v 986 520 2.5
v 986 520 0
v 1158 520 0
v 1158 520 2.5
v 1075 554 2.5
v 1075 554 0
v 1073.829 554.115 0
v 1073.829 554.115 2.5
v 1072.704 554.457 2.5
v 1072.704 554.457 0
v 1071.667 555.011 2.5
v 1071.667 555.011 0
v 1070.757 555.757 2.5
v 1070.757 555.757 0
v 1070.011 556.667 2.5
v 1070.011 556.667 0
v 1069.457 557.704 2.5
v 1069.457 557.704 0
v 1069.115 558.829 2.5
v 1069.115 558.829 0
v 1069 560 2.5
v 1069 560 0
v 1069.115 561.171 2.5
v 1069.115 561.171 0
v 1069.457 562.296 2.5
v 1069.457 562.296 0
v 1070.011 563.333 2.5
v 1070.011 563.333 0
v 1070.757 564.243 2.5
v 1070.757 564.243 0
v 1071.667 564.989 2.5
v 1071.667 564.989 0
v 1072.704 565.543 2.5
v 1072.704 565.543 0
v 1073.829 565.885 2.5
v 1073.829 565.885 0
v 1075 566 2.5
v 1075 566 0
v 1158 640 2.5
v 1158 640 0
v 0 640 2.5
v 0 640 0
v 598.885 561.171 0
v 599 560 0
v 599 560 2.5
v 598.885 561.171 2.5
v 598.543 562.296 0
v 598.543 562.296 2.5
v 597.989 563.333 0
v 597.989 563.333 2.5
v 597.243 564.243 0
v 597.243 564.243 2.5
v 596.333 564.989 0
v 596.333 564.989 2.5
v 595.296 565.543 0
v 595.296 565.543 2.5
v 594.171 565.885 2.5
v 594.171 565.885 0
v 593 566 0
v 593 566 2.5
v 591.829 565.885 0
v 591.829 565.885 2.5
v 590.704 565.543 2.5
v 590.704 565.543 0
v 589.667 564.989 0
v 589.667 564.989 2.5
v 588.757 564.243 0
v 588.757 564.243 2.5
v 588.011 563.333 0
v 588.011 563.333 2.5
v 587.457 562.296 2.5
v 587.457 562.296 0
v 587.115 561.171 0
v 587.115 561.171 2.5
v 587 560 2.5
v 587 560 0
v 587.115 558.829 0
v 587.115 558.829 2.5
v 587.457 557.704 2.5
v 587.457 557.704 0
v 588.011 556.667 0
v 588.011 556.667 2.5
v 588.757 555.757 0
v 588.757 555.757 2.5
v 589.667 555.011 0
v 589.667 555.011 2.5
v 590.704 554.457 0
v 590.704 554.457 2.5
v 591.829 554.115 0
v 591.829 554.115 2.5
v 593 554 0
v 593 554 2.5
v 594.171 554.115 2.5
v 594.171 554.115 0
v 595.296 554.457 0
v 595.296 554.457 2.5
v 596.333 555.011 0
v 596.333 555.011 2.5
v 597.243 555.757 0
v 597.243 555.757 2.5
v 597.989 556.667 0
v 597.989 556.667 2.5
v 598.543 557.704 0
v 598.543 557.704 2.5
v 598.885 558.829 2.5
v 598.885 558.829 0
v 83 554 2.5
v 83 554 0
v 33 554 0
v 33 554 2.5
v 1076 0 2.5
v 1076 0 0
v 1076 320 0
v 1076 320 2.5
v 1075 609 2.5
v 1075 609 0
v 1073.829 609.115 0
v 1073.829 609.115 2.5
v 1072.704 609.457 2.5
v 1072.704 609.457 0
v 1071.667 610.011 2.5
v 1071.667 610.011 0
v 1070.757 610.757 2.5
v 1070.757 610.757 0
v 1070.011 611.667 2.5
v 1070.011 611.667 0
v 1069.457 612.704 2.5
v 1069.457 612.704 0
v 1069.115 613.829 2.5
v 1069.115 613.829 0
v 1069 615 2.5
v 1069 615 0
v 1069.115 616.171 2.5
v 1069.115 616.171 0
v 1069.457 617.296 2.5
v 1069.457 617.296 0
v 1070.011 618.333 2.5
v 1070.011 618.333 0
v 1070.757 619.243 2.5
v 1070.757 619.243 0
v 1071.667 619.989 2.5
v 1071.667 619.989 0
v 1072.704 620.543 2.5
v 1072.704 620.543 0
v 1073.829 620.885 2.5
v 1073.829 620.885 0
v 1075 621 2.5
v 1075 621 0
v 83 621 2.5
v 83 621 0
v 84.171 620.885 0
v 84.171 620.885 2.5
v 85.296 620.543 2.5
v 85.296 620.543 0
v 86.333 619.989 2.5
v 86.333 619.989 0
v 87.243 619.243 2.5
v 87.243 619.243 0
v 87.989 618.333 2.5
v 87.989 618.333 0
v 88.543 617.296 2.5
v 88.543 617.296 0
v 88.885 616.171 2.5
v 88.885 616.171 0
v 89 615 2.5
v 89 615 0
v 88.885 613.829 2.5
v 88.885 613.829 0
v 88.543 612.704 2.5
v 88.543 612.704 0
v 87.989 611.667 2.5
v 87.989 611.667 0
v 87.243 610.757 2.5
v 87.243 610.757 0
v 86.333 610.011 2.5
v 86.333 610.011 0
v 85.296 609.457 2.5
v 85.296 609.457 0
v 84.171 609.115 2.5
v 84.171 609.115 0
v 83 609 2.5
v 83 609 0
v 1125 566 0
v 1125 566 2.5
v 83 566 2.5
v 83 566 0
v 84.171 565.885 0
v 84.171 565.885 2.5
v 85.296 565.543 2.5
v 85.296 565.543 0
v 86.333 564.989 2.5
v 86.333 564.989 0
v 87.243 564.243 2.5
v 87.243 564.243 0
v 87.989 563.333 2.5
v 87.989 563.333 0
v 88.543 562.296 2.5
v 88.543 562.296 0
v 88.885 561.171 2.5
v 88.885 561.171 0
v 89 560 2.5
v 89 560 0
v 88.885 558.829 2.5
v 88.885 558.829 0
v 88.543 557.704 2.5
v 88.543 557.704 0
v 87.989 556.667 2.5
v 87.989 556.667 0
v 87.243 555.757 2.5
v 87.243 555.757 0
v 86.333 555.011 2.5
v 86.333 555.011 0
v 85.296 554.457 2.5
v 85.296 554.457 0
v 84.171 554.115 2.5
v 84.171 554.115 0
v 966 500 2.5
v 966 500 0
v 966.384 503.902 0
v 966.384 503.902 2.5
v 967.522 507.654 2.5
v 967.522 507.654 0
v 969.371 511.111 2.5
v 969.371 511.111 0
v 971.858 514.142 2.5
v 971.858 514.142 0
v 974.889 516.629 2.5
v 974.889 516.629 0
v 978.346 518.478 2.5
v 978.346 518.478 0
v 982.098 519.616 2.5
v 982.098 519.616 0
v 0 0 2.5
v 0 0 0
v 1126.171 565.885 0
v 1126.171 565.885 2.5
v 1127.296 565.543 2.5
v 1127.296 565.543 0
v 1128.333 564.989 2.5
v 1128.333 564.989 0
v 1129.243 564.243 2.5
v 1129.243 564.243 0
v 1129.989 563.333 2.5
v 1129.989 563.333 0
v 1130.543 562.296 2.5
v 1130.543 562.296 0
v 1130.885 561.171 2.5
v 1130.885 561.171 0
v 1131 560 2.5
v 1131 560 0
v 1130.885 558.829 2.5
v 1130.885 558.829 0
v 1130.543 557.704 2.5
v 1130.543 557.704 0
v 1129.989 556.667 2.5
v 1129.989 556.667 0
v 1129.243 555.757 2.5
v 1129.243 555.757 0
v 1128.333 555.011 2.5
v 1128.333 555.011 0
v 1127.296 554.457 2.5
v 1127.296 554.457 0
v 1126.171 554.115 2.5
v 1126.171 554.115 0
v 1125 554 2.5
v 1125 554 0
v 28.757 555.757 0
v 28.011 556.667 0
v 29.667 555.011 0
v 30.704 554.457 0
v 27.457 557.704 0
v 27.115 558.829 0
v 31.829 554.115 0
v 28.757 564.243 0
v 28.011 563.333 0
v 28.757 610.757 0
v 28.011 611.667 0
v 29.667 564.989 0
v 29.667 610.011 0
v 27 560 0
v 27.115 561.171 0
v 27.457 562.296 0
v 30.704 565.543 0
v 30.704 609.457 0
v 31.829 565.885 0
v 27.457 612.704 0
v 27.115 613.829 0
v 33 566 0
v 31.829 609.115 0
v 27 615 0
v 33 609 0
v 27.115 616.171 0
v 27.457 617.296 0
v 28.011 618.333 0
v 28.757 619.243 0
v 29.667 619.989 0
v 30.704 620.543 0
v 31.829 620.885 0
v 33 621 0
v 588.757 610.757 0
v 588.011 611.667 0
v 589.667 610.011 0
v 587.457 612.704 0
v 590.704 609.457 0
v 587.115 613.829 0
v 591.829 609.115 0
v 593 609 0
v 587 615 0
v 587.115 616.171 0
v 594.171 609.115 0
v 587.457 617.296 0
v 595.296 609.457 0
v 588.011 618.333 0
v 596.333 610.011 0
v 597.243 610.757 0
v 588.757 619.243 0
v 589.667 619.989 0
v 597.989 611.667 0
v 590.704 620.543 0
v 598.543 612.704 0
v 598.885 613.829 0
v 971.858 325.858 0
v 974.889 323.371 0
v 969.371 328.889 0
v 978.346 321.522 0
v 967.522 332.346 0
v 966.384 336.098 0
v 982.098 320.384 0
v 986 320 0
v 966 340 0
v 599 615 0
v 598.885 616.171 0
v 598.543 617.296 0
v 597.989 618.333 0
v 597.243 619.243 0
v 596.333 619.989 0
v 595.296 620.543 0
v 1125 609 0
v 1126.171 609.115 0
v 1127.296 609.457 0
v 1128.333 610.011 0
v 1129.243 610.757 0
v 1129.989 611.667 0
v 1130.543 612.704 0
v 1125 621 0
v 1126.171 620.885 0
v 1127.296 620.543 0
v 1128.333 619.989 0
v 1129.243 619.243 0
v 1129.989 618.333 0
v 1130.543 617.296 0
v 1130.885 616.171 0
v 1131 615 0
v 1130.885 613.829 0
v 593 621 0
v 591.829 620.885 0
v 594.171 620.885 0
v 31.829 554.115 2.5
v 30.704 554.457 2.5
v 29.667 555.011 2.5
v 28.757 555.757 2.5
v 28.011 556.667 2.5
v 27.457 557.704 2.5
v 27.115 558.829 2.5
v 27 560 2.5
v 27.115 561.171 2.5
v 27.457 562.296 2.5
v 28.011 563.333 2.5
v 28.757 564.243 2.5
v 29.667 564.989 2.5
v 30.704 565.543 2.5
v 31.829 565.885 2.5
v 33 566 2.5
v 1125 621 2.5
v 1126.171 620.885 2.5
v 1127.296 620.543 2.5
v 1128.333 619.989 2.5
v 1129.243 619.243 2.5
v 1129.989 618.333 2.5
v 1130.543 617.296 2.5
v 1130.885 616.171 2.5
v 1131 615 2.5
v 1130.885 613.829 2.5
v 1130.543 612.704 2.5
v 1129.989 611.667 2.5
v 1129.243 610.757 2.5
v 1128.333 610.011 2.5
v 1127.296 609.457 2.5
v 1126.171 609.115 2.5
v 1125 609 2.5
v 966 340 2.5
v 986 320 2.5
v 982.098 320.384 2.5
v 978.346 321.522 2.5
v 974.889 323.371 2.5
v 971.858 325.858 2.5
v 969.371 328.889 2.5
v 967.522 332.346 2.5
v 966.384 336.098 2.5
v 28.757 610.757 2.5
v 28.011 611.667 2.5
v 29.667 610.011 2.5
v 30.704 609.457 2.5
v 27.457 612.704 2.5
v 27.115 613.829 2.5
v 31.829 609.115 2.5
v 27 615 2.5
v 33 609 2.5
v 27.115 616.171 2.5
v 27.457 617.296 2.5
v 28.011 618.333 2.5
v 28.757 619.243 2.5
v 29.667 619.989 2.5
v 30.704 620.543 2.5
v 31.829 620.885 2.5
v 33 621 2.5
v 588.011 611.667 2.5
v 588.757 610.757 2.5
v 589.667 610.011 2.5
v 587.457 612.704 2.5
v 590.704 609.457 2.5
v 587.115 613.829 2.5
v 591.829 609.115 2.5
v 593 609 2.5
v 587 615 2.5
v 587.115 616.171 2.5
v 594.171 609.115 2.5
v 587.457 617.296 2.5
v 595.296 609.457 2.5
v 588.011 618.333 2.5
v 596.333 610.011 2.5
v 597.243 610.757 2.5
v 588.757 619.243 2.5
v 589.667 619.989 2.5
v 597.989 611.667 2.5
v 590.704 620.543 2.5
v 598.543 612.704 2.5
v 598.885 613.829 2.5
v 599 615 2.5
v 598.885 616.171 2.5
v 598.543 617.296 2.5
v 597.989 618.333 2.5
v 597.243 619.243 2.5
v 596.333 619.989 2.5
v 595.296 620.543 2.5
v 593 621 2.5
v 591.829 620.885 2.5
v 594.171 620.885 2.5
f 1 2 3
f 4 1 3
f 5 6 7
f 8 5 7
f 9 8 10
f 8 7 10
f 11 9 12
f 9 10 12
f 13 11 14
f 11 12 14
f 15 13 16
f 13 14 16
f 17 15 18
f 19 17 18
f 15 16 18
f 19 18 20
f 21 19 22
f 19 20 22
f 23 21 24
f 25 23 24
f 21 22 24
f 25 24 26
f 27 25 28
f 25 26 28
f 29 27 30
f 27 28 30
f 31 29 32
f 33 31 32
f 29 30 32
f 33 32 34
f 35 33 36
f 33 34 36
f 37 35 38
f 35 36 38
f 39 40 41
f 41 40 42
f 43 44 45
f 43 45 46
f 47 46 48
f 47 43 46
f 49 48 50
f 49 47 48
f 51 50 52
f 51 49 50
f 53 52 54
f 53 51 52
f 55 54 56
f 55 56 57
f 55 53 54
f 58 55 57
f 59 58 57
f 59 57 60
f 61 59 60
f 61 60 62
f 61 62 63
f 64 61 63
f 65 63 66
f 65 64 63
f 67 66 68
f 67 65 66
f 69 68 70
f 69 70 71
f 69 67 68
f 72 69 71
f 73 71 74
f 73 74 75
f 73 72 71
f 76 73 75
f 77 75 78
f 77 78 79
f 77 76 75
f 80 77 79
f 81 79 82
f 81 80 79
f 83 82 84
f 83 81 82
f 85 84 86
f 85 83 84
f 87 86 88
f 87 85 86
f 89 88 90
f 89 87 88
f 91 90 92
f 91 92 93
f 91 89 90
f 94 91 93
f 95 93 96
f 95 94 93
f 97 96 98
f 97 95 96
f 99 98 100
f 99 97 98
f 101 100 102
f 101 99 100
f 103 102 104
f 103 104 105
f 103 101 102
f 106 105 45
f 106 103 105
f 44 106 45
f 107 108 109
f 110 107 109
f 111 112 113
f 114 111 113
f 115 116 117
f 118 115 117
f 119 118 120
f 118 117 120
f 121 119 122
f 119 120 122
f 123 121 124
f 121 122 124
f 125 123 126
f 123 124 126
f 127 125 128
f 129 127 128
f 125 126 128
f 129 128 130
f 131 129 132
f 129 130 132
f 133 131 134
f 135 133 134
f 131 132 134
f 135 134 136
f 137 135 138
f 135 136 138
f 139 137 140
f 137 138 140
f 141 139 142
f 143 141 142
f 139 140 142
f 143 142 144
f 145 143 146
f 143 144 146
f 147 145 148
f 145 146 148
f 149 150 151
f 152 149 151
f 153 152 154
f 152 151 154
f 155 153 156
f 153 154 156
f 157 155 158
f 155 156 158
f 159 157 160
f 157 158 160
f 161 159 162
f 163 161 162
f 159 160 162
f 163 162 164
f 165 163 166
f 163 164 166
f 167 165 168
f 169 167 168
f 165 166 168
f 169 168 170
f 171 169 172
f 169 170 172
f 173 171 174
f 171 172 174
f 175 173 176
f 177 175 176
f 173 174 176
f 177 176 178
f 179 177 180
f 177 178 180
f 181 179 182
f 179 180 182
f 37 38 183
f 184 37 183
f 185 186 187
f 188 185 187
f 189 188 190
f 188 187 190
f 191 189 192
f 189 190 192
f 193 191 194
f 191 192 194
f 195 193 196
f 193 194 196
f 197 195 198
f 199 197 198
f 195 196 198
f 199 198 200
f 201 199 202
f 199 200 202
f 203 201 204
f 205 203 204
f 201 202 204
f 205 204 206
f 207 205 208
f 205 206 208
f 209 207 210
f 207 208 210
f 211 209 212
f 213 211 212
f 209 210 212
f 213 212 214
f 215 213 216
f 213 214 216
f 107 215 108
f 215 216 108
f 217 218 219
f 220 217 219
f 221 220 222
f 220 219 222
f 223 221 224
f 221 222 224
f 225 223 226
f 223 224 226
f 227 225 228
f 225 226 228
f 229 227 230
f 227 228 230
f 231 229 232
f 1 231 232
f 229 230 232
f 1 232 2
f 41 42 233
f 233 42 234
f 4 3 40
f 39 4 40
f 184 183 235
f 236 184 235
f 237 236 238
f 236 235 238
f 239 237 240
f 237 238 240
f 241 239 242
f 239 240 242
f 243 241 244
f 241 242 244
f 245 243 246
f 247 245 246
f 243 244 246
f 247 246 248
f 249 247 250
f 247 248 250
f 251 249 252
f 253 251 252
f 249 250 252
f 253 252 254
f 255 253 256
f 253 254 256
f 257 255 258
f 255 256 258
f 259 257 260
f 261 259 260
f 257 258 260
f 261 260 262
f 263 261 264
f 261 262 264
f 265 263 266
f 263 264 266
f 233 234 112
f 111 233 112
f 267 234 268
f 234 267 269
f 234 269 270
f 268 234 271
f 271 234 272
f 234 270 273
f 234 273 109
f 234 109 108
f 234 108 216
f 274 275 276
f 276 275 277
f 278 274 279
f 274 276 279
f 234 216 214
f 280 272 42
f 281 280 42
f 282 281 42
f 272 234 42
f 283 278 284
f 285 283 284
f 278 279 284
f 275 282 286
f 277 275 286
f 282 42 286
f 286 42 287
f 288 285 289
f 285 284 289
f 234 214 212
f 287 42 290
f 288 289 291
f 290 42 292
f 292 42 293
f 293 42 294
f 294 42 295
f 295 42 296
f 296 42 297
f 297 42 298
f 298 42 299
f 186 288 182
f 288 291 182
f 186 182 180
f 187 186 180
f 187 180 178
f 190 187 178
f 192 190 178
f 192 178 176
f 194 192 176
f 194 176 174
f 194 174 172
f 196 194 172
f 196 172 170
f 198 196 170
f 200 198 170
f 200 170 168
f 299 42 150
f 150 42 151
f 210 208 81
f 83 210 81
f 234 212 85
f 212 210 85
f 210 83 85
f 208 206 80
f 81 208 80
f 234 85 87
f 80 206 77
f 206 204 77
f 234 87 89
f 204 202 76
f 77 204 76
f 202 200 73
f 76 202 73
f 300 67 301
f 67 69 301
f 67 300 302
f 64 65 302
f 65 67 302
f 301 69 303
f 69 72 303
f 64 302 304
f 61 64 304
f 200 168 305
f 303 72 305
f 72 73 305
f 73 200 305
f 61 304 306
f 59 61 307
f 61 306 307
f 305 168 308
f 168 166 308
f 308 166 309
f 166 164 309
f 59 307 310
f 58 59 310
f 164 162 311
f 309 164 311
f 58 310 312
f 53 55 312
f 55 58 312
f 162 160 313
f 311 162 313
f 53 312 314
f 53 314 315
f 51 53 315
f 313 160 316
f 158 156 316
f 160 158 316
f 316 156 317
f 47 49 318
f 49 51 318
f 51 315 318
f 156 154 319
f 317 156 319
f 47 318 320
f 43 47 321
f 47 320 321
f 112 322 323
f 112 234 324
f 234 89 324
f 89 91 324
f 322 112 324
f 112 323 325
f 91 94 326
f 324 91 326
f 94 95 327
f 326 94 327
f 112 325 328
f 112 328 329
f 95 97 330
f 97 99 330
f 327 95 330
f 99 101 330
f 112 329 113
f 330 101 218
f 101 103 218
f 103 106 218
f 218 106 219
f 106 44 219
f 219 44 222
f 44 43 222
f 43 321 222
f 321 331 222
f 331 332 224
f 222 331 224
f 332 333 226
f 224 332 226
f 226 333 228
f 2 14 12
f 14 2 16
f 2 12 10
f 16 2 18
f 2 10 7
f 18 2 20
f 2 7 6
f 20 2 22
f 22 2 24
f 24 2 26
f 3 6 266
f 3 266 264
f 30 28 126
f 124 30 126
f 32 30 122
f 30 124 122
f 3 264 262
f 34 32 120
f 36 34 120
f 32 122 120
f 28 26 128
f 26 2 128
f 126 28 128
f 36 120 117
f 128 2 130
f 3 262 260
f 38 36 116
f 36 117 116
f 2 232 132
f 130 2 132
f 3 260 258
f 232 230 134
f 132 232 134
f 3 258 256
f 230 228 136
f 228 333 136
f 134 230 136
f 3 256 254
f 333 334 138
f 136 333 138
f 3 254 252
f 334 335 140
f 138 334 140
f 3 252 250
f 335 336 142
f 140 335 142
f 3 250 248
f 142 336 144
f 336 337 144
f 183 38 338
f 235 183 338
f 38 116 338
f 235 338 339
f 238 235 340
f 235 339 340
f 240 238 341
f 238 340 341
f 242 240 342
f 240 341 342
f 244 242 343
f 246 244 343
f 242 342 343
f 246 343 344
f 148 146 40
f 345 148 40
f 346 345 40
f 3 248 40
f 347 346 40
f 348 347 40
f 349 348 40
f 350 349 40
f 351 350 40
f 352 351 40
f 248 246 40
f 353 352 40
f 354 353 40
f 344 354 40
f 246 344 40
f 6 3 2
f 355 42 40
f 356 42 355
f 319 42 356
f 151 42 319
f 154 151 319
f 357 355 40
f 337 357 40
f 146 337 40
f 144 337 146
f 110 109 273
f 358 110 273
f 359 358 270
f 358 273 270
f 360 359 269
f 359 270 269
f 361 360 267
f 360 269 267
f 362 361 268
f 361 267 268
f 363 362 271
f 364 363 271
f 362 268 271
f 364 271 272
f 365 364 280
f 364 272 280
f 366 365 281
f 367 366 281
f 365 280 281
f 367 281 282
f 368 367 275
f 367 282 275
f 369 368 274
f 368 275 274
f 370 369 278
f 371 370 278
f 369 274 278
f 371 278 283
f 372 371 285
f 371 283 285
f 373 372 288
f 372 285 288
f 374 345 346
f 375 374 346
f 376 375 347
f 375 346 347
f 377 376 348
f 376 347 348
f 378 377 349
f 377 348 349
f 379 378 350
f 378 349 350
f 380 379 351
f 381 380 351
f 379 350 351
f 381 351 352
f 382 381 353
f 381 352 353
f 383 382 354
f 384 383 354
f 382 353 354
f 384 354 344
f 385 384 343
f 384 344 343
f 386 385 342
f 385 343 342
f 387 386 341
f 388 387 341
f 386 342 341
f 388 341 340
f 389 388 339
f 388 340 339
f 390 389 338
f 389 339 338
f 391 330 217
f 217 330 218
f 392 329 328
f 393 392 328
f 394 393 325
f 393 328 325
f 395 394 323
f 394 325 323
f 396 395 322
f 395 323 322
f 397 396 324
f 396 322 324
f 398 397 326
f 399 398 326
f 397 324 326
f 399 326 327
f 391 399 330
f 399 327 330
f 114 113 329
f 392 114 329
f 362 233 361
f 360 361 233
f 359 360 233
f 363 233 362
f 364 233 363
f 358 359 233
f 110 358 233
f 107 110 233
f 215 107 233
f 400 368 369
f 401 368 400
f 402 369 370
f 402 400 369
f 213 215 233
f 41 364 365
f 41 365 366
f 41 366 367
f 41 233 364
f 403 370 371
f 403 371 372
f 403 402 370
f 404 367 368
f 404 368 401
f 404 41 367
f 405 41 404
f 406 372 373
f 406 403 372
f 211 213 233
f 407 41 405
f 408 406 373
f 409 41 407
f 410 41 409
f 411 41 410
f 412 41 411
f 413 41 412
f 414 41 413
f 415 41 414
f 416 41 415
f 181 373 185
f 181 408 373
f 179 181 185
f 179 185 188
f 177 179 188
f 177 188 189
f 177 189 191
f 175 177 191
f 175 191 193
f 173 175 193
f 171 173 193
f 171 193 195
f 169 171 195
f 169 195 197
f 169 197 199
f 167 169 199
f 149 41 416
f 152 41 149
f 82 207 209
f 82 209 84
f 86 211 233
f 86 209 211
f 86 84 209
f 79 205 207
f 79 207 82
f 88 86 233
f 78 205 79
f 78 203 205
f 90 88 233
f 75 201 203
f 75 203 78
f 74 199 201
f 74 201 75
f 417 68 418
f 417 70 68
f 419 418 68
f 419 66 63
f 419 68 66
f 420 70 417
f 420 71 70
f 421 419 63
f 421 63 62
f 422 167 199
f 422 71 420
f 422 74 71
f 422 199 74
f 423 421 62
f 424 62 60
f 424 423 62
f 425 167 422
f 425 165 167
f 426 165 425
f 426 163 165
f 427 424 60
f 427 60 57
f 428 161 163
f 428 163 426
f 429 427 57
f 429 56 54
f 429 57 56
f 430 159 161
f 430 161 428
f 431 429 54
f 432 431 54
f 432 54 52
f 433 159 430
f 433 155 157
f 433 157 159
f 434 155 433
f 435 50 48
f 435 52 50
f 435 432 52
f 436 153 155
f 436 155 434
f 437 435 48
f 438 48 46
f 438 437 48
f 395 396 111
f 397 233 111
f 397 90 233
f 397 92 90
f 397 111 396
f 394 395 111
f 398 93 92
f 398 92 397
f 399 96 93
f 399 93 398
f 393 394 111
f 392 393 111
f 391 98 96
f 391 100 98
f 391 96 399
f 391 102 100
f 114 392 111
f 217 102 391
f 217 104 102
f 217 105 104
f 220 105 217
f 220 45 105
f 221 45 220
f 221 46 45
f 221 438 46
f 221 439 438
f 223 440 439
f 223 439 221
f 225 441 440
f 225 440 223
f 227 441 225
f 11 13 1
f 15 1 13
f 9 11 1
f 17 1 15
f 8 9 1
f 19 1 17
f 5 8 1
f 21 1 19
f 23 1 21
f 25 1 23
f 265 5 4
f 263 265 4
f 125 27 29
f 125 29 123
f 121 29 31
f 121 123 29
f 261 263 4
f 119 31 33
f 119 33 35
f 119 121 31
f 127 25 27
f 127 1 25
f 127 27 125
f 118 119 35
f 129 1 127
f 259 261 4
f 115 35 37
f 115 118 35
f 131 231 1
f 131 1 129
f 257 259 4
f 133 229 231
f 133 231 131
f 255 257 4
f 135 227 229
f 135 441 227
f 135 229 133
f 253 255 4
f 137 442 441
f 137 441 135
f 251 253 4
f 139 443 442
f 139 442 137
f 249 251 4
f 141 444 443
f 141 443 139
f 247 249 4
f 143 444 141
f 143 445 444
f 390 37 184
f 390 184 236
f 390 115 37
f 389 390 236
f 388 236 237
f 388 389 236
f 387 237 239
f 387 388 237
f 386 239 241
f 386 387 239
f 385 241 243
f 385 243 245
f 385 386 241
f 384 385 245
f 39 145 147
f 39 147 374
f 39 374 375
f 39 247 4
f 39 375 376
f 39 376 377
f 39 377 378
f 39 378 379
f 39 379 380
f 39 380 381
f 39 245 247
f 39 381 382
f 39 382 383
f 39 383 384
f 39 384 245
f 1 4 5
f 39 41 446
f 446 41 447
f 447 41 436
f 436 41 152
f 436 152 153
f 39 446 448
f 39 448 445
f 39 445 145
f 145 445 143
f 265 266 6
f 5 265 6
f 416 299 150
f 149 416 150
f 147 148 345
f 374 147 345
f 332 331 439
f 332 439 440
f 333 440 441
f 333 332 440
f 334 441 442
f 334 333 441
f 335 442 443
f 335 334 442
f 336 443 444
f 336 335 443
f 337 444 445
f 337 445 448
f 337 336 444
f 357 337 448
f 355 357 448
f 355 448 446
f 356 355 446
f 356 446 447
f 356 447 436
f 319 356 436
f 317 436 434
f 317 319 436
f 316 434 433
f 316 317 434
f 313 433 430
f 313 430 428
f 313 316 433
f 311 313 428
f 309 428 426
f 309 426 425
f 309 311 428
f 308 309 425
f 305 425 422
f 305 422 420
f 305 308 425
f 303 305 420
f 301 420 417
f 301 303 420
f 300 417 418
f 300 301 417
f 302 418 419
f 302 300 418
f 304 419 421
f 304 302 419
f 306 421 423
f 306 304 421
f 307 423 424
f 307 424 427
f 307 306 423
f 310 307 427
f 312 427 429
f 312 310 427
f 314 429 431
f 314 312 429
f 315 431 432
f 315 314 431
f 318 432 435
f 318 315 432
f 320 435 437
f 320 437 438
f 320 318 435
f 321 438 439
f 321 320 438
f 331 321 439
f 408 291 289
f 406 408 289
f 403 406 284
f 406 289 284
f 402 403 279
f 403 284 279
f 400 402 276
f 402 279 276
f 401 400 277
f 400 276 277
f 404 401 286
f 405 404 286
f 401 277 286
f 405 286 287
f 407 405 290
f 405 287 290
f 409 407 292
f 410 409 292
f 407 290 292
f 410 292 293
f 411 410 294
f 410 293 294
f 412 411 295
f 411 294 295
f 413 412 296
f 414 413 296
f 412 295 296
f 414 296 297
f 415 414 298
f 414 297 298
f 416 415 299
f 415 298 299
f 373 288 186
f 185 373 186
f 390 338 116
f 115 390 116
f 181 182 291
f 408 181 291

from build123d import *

# Parameters (mm, degrees)
F0_R     = 6
F1_DEPTH = 2.5


with BuildPart() as f1:
    # F0 (on Top) → F1 (new body)
    with BuildSketch(Plane.XY):
        with BuildLine():
            Line((0, 640), (0, 0))
            Line((0, 0), (1076, 0))
            Line((1076, 0), (1076, 320))
            Line((1076, 320), (986, 320))
            ThreePointArc((986, 320), (971.857864, 325.857864), (966, 340))
            Line((966, 340), (966, 500))
            ThreePointArc((966, 500), (971.857864, 514.142136), (986, 520))
            Line((986, 520), (1158, 520))
            Line((1158, 520), (1158, 640))
            Line((1158, 640), (0, 640))
        make_face()
        with BuildLine():
            ThreePointArc((33, 554), (27, 560), (33, 566))
            Line((33, 566), (83, 566))
            ThreePointArc((83, 566), (89, 560), (83, 554))
            Line((83, 554), (33, 554))
        make_face(mode=Mode.SUBTRACT)
        with BuildLine():
            ThreePointArc((33, 609), (27, 615), (33, 621))
            Line((33, 621), (83, 621))
            ThreePointArc((83, 621), (89, 615), (83, 609))
            Line((83, 609), (33, 609))
        make_face(mode=Mode.SUBTRACT)
        with Locations((593, 560)):
            Circle(F0_R, mode=Mode.SUBTRACT)
        with Locations((593, 615)):
            Circle(F0_R, mode=Mode.SUBTRACT)
        with BuildLine():
            ThreePointArc((1075, 554), (1069, 560), (1075, 566))
            Line((1075, 566), (1125, 566))
            ThreePointArc((1125, 566), (1131, 560), (1125, 554))
            Line((1125, 554), (1075, 554))
        make_face(mode=Mode.SUBTRACT)
        with BuildLine():
            ThreePointArc((1075, 609), (1069, 615), (1075, 621))
            Line((1075, 621), (1125, 621))
            ThreePointArc((1125, 621), (1131, 615), (1125, 609))
            Line((1125, 609), (1075, 609))
        make_face(mode=Mode.SUBTRACT)
    extrude(amount=F1_DEPTH)


solid = f1.part
